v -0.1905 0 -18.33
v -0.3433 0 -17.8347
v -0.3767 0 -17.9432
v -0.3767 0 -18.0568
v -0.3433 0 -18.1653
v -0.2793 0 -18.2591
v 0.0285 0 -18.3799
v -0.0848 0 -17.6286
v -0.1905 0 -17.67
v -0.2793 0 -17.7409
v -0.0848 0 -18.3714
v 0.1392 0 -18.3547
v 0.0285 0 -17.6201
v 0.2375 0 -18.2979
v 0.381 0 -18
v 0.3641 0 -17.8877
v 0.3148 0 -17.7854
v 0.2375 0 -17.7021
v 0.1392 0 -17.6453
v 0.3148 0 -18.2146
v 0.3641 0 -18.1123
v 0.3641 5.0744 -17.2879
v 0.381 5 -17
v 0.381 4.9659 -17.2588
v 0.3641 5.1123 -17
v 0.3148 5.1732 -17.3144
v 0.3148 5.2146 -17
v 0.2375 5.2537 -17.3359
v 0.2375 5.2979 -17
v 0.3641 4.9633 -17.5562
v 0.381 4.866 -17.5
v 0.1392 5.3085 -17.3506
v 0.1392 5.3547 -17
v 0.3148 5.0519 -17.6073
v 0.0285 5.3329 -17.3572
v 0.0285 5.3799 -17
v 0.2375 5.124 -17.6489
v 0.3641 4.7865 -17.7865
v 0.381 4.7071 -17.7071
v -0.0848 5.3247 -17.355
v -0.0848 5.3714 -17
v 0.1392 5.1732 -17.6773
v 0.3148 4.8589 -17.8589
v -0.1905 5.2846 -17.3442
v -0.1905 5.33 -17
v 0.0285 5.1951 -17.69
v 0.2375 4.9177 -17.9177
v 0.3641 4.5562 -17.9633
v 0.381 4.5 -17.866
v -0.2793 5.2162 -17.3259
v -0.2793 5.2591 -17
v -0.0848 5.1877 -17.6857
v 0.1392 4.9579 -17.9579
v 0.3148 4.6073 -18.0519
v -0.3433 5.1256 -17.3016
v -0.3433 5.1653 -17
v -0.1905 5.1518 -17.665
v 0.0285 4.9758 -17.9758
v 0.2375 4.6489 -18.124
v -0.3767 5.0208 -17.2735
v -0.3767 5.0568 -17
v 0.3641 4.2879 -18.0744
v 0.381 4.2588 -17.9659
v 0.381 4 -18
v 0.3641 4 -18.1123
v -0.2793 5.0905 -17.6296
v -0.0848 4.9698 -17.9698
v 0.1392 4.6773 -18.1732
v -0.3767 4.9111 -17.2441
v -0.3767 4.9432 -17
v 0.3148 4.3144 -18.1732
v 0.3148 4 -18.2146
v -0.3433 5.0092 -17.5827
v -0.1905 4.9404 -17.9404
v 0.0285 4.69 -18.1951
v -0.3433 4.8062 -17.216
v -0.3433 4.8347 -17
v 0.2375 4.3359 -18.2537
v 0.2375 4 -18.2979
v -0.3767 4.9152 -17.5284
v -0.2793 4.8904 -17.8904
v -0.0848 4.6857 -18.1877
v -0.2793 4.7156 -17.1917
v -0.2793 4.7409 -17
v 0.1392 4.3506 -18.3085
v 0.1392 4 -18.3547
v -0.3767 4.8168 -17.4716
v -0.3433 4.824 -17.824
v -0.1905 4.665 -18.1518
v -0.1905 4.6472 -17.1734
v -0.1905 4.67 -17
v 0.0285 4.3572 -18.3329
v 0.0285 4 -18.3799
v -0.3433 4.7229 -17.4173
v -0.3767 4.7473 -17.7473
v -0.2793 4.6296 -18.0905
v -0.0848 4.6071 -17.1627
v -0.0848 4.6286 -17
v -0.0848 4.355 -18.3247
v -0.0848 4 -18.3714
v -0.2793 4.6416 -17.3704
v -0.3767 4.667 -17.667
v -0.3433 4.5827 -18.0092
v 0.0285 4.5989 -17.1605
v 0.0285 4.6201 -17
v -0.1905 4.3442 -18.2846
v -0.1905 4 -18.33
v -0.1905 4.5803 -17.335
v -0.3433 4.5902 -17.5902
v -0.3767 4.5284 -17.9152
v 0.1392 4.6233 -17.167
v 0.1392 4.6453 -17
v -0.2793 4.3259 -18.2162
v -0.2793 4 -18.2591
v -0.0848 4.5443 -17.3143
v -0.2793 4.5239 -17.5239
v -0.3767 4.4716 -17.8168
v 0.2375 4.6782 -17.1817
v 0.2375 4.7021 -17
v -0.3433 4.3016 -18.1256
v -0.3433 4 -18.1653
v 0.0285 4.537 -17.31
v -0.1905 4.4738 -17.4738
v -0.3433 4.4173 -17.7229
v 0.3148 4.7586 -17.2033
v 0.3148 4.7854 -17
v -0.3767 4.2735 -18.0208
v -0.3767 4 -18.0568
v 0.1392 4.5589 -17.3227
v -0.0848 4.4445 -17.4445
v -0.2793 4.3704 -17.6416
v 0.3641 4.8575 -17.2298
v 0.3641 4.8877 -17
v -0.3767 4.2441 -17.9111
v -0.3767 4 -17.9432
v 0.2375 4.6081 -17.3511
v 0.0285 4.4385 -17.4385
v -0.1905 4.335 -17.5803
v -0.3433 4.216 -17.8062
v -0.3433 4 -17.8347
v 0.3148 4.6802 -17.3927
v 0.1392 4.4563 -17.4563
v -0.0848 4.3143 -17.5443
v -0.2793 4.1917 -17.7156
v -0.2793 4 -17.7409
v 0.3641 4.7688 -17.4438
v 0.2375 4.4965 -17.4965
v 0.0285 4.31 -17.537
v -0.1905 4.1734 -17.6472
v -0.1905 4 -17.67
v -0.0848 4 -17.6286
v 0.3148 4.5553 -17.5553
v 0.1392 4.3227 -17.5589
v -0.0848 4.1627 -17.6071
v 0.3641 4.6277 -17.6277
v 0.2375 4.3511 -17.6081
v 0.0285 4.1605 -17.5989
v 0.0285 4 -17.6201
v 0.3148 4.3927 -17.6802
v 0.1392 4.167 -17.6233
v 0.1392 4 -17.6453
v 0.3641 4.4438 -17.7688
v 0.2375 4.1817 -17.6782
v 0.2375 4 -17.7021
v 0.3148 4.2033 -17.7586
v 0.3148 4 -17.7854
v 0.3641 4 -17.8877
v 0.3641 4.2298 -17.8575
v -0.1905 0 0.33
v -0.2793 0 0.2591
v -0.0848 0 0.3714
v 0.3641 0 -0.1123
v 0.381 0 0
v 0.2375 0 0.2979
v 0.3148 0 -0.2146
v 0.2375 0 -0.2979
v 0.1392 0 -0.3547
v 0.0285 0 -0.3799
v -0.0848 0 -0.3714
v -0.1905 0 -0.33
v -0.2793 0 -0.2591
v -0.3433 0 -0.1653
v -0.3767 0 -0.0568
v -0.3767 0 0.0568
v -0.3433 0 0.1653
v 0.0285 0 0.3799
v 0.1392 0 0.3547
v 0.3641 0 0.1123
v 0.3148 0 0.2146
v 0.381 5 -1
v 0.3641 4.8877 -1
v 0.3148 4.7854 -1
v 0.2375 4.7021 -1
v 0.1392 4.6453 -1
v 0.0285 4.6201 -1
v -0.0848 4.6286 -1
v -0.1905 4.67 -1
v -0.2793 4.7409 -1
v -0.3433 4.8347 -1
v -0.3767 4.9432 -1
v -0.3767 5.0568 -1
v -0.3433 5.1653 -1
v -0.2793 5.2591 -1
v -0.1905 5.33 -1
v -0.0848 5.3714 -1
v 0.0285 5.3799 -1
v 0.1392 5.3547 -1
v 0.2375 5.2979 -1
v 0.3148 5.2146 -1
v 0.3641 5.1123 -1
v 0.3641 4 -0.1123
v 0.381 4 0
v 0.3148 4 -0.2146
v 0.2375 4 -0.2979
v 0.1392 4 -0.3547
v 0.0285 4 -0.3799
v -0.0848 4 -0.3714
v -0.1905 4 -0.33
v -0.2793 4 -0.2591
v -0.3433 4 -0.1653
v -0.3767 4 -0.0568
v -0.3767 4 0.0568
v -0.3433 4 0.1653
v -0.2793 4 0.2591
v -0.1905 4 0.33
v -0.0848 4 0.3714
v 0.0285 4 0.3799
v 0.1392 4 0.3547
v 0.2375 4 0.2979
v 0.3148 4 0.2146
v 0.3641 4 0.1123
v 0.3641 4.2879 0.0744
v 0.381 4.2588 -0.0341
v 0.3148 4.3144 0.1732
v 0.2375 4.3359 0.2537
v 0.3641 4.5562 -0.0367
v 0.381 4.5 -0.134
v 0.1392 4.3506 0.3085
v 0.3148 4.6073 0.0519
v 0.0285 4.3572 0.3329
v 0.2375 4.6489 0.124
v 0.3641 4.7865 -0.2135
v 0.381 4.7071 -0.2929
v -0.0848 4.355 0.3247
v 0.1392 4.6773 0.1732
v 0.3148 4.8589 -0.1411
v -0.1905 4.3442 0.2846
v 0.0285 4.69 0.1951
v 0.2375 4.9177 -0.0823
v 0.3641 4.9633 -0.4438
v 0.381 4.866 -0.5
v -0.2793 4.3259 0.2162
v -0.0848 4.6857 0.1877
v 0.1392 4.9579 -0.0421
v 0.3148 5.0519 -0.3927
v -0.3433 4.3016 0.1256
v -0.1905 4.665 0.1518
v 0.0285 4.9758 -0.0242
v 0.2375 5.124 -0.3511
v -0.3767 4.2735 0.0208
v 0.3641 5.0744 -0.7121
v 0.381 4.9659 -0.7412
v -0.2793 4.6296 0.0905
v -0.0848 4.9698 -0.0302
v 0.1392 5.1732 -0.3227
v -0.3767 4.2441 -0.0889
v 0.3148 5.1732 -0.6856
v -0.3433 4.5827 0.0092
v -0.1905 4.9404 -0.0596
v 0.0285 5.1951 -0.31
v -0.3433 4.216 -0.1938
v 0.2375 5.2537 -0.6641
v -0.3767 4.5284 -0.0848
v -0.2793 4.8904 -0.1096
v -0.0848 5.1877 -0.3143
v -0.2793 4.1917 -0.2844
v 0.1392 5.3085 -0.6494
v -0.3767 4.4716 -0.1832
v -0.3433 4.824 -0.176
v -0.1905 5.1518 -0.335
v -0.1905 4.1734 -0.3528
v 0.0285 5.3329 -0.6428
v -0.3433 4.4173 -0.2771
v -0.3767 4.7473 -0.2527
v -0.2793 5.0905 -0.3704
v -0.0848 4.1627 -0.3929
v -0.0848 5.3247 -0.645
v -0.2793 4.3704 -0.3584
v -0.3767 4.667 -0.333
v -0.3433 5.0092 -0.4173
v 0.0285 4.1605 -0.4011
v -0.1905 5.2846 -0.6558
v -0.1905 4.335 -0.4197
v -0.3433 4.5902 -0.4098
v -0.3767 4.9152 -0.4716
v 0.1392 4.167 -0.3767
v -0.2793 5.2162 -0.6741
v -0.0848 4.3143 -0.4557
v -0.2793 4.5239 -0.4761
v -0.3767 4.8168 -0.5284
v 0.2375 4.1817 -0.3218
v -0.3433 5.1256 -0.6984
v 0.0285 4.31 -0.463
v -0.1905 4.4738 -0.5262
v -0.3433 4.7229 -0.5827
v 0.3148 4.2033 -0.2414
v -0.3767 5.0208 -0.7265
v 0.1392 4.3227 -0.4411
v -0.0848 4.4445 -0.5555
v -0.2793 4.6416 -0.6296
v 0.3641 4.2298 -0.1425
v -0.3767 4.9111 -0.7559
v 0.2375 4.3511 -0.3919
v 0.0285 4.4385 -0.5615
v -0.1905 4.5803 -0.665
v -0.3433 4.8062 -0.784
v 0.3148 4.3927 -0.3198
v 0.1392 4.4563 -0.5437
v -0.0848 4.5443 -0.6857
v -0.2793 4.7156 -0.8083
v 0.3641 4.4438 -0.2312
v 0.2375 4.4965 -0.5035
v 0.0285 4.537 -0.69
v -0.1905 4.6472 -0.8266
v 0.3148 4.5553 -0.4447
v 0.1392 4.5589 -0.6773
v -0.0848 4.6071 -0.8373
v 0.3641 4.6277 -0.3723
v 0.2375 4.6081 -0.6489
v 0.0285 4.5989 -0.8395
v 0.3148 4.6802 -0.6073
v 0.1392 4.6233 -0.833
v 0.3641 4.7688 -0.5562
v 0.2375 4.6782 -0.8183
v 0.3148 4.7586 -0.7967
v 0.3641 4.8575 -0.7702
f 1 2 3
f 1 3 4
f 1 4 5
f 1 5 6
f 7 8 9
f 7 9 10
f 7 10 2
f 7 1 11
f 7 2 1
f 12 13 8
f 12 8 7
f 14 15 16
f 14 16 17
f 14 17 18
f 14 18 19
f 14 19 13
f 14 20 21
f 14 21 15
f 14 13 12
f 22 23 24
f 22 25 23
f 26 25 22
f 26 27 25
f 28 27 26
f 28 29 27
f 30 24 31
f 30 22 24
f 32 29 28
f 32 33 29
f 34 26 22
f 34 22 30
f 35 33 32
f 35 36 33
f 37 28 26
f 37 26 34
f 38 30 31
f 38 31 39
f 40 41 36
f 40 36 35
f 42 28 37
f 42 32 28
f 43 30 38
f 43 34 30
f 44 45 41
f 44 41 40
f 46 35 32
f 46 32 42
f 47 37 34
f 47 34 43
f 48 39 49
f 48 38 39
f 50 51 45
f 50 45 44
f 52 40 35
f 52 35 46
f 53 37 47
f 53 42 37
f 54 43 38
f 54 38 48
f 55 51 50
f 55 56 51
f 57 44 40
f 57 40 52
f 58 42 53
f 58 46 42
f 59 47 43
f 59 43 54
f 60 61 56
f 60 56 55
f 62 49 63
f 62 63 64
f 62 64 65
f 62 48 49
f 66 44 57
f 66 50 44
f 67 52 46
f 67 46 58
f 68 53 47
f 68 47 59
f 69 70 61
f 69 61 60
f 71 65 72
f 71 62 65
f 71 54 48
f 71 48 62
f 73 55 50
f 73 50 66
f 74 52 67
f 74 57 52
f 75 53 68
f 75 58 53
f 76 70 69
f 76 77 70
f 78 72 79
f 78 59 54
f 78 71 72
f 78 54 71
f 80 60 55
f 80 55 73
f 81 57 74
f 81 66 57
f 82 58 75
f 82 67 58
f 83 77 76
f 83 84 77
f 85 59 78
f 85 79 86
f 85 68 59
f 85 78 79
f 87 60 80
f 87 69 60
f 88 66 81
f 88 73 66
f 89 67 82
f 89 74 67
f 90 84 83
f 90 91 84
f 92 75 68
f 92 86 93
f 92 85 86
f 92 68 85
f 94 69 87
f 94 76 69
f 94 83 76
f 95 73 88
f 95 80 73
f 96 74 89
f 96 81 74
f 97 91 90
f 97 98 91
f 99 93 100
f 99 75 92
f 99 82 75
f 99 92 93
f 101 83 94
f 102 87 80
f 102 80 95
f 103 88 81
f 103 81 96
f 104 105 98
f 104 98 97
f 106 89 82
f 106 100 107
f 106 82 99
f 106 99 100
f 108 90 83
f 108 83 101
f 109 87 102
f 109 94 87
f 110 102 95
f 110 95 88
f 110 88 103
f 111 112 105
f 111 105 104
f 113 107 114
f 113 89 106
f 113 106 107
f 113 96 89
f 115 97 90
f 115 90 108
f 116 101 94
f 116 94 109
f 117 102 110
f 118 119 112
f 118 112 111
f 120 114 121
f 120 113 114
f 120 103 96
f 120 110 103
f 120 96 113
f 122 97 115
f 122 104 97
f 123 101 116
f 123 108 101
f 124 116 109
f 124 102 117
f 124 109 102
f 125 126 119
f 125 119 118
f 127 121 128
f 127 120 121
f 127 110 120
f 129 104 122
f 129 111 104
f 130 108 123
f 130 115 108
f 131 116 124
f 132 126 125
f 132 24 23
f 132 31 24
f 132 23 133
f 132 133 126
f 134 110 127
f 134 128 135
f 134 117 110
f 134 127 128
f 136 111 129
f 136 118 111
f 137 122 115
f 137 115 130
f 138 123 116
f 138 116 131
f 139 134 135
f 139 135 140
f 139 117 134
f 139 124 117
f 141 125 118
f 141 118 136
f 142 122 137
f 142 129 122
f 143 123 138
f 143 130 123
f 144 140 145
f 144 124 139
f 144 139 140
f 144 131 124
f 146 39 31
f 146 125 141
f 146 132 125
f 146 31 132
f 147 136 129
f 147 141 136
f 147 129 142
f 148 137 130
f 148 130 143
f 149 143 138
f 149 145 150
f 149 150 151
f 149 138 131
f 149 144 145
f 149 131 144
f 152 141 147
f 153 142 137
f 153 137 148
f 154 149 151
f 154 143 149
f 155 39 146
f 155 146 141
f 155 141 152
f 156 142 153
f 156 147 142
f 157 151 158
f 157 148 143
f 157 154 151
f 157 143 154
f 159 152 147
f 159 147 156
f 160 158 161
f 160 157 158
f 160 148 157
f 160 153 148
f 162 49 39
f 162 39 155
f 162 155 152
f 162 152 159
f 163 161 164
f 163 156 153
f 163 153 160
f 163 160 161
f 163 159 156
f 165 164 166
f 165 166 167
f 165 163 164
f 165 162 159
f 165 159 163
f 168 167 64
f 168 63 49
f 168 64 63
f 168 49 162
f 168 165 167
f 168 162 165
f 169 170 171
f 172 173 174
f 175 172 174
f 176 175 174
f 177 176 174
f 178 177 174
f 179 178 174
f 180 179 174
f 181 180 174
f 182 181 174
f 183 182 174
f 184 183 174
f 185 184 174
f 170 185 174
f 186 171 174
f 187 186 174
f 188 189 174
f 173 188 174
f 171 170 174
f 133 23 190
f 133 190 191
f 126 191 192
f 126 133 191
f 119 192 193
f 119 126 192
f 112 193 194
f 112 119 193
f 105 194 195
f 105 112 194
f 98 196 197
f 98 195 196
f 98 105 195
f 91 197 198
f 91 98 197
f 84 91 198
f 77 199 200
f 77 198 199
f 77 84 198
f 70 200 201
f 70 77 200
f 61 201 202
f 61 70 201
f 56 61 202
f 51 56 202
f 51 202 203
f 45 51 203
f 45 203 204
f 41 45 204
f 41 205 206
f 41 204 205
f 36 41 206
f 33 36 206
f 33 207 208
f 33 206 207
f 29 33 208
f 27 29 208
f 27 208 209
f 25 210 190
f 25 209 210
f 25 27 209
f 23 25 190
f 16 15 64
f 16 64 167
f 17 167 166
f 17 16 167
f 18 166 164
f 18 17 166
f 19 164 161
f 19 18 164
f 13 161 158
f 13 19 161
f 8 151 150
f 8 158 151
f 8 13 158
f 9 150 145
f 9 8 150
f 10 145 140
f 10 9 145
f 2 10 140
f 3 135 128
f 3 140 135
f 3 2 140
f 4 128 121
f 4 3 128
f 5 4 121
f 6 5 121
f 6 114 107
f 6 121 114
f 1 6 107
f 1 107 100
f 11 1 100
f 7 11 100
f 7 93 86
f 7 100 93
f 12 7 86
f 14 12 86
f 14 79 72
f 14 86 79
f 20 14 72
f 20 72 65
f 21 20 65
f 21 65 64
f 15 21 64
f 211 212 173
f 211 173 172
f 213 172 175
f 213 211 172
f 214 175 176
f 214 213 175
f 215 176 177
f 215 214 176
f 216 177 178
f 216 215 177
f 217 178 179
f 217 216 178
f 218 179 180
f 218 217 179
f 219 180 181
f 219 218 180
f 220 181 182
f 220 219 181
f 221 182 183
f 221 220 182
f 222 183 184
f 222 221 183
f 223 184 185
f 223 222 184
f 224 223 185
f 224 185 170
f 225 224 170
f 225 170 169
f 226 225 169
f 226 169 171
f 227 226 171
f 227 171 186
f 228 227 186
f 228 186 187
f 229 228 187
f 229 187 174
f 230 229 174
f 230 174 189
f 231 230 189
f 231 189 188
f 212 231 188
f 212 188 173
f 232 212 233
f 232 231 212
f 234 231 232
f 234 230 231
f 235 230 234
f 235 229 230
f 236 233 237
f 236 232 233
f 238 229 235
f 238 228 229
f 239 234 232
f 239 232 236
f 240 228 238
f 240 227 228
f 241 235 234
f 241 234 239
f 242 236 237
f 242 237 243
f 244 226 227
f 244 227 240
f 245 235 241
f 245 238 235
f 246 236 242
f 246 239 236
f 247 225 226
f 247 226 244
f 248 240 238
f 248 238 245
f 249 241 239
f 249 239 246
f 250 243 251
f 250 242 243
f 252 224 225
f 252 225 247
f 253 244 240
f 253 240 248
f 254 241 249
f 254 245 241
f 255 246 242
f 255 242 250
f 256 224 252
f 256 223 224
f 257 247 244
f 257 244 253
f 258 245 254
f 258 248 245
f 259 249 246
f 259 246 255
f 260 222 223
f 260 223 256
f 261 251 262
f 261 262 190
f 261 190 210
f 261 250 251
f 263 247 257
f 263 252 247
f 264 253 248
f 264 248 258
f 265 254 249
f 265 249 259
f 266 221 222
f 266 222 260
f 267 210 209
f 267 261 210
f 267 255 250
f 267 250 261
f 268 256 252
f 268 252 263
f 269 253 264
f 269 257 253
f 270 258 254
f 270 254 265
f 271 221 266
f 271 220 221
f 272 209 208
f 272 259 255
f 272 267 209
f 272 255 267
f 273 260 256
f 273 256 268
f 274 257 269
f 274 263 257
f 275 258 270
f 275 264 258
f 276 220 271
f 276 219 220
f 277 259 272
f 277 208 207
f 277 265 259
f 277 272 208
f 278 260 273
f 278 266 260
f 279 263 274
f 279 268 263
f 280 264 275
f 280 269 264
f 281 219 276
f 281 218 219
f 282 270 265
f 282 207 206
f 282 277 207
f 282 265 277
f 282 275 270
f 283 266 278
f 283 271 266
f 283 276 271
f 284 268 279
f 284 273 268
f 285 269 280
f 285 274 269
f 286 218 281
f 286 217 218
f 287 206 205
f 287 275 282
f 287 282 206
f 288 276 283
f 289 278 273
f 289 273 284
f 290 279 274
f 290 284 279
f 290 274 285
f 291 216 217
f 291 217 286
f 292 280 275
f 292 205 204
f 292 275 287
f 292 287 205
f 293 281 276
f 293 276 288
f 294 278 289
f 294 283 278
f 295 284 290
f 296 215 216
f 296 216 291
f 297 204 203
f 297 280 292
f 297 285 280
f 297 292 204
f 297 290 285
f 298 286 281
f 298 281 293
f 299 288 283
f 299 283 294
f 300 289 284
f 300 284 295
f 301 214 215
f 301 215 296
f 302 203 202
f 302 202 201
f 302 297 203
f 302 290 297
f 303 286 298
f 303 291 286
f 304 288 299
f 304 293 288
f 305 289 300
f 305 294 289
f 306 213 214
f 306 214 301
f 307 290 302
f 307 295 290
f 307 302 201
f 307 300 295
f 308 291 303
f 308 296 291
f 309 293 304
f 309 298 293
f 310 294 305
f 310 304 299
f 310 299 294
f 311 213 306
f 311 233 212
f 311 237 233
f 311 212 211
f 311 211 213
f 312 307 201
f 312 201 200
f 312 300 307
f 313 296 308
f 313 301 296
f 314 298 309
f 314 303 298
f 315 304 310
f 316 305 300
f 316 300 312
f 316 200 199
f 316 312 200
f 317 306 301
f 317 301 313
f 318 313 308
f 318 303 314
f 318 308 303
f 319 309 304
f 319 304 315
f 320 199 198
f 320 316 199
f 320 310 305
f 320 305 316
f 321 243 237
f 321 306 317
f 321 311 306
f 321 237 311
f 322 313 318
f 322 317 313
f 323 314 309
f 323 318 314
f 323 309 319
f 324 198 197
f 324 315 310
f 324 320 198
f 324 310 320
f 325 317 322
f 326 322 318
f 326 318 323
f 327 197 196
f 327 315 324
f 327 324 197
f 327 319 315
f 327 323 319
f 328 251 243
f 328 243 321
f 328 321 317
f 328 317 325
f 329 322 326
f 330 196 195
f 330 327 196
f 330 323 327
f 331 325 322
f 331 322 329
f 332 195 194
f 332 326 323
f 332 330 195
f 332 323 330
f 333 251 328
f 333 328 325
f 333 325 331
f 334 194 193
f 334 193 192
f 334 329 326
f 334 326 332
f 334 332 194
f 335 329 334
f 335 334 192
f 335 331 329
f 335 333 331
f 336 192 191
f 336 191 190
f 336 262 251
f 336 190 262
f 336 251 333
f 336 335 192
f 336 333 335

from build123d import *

# Parameters (mm, degrees)
SKETCH2_R = 0.381


with BuildPart() as part:
    # Sweep1: sweep along a path in Sketch3
    with BuildLine(Plane(origin=(0, 0, 0), x_dir=(0, 0, -1), z_dir=(1, 0, 0))) as sweep1_path:
        Line((0, 0), (0, 4))
        ThreePointArc((0, 4), (0.292893219, 4.707106781), (1, 5))
        Line((1, 5), (17, 5))
        ThreePointArc((17, 5), (17.707106781, 4.707106781), (18, 4))
        Line((18, 4), (18, 0))
    # Sketch2 → Sweep1 (sweep)
    with BuildSketch(Plane(origin=(0, 0, 0), x_dir=(1, 0, 0), z_dir=(0, 1, 0))):
        Circle(SKETCH2_R)
    sweep(path=sweep1_path.line)


solid = part.part
